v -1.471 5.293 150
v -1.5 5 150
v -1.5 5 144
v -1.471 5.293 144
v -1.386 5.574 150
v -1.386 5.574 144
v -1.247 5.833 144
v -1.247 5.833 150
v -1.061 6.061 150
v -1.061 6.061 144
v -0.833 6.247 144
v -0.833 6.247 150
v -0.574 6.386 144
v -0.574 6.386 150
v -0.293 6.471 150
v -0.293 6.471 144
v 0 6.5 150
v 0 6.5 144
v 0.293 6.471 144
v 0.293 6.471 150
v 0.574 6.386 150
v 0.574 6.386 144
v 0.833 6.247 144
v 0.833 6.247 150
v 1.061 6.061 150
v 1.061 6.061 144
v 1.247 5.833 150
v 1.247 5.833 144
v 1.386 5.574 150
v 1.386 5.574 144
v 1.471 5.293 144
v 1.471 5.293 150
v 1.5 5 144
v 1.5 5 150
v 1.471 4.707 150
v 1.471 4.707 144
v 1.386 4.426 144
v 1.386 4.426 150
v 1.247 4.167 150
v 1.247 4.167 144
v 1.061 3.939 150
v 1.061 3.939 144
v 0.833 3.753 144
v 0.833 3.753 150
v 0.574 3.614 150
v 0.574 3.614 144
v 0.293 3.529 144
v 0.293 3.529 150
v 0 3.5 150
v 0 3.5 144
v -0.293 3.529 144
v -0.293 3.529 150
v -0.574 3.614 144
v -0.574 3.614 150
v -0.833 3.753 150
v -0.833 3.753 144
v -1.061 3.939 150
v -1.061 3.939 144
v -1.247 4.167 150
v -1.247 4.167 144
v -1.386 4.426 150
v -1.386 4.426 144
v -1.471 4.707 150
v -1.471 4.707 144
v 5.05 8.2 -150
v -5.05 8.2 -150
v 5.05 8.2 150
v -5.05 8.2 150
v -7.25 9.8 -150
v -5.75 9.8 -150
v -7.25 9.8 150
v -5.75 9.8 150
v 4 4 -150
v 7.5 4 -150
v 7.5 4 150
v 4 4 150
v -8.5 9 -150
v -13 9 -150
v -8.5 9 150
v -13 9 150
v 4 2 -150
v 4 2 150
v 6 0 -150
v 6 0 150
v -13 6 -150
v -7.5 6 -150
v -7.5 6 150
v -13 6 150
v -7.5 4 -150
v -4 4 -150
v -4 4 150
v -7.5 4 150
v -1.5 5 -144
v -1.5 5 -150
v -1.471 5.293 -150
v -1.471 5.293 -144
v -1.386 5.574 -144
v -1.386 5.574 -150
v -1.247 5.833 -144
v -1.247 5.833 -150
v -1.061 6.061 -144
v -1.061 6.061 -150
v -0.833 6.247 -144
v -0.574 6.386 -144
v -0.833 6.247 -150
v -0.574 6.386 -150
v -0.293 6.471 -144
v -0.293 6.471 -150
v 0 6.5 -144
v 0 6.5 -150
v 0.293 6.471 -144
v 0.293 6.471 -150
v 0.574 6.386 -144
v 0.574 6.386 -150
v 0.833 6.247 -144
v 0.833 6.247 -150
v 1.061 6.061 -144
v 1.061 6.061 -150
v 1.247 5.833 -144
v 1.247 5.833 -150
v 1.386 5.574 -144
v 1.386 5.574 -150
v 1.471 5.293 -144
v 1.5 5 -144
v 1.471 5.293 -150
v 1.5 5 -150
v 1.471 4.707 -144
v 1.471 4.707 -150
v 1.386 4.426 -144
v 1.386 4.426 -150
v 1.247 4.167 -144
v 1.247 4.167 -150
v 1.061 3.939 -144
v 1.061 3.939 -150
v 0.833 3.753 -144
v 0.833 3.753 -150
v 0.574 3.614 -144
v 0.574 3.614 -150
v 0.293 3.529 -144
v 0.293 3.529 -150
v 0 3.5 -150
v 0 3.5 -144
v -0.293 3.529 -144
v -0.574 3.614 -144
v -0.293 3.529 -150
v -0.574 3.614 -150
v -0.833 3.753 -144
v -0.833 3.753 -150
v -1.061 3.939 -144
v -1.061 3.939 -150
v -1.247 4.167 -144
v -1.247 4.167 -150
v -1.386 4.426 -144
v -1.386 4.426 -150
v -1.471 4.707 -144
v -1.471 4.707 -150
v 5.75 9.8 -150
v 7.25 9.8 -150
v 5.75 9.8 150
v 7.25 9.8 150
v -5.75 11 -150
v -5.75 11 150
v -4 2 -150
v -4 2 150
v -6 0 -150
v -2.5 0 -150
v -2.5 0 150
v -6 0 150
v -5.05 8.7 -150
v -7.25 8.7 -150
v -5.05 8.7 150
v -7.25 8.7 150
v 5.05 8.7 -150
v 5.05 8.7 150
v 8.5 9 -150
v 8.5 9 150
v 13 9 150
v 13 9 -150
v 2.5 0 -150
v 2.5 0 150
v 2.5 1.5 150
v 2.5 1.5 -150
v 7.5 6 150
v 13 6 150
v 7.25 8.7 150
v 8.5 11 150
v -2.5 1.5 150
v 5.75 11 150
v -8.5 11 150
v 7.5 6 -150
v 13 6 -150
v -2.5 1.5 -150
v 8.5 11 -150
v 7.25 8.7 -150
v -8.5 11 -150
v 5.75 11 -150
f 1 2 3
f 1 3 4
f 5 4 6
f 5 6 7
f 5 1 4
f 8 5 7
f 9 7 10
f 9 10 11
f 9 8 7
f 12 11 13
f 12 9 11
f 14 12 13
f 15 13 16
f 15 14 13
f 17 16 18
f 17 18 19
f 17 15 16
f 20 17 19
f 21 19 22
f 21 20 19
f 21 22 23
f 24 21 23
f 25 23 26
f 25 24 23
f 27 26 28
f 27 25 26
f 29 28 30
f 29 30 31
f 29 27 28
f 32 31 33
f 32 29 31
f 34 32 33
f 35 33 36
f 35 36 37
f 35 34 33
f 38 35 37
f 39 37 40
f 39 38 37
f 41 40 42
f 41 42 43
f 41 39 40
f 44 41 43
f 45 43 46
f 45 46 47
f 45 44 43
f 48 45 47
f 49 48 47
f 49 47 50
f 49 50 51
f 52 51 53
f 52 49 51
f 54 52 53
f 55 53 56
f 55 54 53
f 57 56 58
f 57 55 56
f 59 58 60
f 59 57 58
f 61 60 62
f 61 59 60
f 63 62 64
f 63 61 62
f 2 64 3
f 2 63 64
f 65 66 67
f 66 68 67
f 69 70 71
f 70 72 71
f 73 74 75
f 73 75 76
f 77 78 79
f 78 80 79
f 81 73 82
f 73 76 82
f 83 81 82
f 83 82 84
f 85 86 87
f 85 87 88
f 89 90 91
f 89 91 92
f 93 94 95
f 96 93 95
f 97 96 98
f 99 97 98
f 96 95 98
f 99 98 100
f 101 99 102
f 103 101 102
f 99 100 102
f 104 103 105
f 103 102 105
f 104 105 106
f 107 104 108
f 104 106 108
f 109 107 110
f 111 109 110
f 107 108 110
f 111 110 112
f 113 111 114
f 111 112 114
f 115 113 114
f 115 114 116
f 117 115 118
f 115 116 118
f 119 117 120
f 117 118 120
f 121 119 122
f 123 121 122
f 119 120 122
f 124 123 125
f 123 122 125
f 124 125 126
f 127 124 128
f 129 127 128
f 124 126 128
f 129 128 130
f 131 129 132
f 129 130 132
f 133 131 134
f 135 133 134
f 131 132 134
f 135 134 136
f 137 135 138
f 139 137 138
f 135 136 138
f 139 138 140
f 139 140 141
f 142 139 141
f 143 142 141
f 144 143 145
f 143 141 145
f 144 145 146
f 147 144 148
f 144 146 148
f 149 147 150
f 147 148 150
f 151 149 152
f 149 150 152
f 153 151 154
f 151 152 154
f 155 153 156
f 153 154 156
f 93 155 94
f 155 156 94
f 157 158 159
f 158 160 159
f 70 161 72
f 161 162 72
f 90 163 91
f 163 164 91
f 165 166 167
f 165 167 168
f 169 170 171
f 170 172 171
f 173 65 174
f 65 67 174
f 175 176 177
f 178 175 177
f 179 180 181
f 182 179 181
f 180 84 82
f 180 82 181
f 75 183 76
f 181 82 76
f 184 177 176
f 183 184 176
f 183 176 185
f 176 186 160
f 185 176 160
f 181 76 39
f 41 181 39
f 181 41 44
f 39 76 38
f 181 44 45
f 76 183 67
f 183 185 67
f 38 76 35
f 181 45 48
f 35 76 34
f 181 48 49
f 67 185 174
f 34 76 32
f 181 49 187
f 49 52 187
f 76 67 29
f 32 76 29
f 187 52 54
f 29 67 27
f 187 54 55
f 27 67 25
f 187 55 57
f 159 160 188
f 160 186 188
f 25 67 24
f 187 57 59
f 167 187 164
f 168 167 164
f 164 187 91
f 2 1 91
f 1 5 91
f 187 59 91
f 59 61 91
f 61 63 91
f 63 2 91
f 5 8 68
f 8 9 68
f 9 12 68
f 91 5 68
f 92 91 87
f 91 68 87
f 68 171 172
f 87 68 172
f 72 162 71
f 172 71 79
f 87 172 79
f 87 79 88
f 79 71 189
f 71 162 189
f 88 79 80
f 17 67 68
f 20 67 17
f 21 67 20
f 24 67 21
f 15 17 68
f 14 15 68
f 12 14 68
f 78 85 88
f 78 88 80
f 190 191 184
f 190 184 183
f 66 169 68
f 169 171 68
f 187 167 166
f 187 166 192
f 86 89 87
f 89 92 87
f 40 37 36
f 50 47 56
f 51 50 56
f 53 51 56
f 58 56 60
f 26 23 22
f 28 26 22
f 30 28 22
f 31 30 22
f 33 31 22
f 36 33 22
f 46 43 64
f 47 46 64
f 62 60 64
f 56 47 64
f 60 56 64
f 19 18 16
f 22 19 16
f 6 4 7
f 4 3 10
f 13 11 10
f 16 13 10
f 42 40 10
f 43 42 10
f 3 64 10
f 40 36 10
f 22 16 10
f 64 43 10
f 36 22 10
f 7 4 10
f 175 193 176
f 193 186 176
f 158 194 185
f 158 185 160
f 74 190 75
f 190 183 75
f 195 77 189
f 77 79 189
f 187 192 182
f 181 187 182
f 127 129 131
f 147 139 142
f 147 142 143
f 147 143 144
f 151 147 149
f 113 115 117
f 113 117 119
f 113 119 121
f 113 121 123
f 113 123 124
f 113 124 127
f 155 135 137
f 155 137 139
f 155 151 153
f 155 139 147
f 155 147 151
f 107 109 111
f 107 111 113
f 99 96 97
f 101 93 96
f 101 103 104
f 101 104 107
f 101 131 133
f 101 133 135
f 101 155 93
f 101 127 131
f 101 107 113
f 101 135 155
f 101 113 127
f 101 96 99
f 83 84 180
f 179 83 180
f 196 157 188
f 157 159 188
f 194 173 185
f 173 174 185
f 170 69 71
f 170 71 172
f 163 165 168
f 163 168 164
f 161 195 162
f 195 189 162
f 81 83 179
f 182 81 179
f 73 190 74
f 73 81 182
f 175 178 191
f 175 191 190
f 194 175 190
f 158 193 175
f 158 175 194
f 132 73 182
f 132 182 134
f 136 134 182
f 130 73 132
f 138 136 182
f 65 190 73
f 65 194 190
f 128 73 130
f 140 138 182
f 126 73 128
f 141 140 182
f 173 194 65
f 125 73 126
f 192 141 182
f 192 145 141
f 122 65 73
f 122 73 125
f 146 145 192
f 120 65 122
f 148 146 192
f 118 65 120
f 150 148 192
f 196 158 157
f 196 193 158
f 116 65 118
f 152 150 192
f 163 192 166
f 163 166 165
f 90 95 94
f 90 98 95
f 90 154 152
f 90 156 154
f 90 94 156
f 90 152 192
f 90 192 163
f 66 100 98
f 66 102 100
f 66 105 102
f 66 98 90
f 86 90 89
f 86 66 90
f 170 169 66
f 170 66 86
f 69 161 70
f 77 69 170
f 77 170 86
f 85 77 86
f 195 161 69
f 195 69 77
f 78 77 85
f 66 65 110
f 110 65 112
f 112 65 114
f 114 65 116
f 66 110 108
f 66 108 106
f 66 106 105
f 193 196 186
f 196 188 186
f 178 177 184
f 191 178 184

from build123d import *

# Parameters (mm, degrees)
EXTRUDE_1_DEPTH     = 150
SKETCH_2_R          = 1.5
CUT_EXTRUDE_1_DEPTH = 6
CUT_EXTRUDE_3_REACH = 302
SKETCH_4_W          = 5
SKETCH_4_H          = 1.5


with BuildPart() as part:
    # 草图1 → 凸台-拉伸1 (new body, symmetric)
    with BuildSketch(Plane.XY):
        Polygon((13, 6), (7.5, 6), (7.5, 4), (4, 4), (4, 2), (6, 0), (-6, 0), (-4, 2), (-4, 4), (-7.5, 4), (-7.5, 6), (-13, 6), (-13, 9), (-8.5, 9), (-8.5, 11), (-5.75, 11), (-5.75, 9.8), (-7.25, 9.8), (-7.25, 8.7), (-5.05, 8.7), (-5.05, 8.2), (5.05, 8.2), (5.05, 8.7), (7.25, 8.7), (7.25, 9.8), (5.75, 9.8), (5.75, 11), (8.5, 11), (8.5, 9), (13, 9), align=None)
    extrude(amount=EXTRUDE_1_DEPTH, both=True)

    # 草图2 → 切除-拉伸1 (cut)
    with BuildSketch(Plane(origin=(0, 0, -150), x_dir=(-1, 0, 0), z_dir=(0, 0, -1))):
        with Locations((0, 5)):
            Circle(SKETCH_2_R)
    cut_extrude_1 = extrude(amount=-CUT_EXTRUDE_1_DEPTH, mode=Mode.SUBTRACT)

    # 草图4 → 切除-拉伸3 (cut, up to next)
    with BuildSketch(Plane.XY.offset(150), mode=Mode.PRIVATE) as cut_extrude_3_sk1:
        with Locations((0, 0.75)):
            Rectangle(SKETCH_4_W, SKETCH_4_H)
    cut_extrude_3_tool1 = extrude(cut_extrude_3_sk1.sketch, amount=-CUT_EXTRUDE_3_REACH, mode=Mode.PRIVATE) & part.part
    add(cut_extrude_3_tool1.solids().sort_by_distance((0, 0.75, 150))[0], mode=Mode.SUBTRACT)

    # 镜向1: 切除-拉伸1 across plane
    add(cut_extrude_1.mirror(Plane.XY), mode=Mode.SUBTRACT)


solid = part.part
